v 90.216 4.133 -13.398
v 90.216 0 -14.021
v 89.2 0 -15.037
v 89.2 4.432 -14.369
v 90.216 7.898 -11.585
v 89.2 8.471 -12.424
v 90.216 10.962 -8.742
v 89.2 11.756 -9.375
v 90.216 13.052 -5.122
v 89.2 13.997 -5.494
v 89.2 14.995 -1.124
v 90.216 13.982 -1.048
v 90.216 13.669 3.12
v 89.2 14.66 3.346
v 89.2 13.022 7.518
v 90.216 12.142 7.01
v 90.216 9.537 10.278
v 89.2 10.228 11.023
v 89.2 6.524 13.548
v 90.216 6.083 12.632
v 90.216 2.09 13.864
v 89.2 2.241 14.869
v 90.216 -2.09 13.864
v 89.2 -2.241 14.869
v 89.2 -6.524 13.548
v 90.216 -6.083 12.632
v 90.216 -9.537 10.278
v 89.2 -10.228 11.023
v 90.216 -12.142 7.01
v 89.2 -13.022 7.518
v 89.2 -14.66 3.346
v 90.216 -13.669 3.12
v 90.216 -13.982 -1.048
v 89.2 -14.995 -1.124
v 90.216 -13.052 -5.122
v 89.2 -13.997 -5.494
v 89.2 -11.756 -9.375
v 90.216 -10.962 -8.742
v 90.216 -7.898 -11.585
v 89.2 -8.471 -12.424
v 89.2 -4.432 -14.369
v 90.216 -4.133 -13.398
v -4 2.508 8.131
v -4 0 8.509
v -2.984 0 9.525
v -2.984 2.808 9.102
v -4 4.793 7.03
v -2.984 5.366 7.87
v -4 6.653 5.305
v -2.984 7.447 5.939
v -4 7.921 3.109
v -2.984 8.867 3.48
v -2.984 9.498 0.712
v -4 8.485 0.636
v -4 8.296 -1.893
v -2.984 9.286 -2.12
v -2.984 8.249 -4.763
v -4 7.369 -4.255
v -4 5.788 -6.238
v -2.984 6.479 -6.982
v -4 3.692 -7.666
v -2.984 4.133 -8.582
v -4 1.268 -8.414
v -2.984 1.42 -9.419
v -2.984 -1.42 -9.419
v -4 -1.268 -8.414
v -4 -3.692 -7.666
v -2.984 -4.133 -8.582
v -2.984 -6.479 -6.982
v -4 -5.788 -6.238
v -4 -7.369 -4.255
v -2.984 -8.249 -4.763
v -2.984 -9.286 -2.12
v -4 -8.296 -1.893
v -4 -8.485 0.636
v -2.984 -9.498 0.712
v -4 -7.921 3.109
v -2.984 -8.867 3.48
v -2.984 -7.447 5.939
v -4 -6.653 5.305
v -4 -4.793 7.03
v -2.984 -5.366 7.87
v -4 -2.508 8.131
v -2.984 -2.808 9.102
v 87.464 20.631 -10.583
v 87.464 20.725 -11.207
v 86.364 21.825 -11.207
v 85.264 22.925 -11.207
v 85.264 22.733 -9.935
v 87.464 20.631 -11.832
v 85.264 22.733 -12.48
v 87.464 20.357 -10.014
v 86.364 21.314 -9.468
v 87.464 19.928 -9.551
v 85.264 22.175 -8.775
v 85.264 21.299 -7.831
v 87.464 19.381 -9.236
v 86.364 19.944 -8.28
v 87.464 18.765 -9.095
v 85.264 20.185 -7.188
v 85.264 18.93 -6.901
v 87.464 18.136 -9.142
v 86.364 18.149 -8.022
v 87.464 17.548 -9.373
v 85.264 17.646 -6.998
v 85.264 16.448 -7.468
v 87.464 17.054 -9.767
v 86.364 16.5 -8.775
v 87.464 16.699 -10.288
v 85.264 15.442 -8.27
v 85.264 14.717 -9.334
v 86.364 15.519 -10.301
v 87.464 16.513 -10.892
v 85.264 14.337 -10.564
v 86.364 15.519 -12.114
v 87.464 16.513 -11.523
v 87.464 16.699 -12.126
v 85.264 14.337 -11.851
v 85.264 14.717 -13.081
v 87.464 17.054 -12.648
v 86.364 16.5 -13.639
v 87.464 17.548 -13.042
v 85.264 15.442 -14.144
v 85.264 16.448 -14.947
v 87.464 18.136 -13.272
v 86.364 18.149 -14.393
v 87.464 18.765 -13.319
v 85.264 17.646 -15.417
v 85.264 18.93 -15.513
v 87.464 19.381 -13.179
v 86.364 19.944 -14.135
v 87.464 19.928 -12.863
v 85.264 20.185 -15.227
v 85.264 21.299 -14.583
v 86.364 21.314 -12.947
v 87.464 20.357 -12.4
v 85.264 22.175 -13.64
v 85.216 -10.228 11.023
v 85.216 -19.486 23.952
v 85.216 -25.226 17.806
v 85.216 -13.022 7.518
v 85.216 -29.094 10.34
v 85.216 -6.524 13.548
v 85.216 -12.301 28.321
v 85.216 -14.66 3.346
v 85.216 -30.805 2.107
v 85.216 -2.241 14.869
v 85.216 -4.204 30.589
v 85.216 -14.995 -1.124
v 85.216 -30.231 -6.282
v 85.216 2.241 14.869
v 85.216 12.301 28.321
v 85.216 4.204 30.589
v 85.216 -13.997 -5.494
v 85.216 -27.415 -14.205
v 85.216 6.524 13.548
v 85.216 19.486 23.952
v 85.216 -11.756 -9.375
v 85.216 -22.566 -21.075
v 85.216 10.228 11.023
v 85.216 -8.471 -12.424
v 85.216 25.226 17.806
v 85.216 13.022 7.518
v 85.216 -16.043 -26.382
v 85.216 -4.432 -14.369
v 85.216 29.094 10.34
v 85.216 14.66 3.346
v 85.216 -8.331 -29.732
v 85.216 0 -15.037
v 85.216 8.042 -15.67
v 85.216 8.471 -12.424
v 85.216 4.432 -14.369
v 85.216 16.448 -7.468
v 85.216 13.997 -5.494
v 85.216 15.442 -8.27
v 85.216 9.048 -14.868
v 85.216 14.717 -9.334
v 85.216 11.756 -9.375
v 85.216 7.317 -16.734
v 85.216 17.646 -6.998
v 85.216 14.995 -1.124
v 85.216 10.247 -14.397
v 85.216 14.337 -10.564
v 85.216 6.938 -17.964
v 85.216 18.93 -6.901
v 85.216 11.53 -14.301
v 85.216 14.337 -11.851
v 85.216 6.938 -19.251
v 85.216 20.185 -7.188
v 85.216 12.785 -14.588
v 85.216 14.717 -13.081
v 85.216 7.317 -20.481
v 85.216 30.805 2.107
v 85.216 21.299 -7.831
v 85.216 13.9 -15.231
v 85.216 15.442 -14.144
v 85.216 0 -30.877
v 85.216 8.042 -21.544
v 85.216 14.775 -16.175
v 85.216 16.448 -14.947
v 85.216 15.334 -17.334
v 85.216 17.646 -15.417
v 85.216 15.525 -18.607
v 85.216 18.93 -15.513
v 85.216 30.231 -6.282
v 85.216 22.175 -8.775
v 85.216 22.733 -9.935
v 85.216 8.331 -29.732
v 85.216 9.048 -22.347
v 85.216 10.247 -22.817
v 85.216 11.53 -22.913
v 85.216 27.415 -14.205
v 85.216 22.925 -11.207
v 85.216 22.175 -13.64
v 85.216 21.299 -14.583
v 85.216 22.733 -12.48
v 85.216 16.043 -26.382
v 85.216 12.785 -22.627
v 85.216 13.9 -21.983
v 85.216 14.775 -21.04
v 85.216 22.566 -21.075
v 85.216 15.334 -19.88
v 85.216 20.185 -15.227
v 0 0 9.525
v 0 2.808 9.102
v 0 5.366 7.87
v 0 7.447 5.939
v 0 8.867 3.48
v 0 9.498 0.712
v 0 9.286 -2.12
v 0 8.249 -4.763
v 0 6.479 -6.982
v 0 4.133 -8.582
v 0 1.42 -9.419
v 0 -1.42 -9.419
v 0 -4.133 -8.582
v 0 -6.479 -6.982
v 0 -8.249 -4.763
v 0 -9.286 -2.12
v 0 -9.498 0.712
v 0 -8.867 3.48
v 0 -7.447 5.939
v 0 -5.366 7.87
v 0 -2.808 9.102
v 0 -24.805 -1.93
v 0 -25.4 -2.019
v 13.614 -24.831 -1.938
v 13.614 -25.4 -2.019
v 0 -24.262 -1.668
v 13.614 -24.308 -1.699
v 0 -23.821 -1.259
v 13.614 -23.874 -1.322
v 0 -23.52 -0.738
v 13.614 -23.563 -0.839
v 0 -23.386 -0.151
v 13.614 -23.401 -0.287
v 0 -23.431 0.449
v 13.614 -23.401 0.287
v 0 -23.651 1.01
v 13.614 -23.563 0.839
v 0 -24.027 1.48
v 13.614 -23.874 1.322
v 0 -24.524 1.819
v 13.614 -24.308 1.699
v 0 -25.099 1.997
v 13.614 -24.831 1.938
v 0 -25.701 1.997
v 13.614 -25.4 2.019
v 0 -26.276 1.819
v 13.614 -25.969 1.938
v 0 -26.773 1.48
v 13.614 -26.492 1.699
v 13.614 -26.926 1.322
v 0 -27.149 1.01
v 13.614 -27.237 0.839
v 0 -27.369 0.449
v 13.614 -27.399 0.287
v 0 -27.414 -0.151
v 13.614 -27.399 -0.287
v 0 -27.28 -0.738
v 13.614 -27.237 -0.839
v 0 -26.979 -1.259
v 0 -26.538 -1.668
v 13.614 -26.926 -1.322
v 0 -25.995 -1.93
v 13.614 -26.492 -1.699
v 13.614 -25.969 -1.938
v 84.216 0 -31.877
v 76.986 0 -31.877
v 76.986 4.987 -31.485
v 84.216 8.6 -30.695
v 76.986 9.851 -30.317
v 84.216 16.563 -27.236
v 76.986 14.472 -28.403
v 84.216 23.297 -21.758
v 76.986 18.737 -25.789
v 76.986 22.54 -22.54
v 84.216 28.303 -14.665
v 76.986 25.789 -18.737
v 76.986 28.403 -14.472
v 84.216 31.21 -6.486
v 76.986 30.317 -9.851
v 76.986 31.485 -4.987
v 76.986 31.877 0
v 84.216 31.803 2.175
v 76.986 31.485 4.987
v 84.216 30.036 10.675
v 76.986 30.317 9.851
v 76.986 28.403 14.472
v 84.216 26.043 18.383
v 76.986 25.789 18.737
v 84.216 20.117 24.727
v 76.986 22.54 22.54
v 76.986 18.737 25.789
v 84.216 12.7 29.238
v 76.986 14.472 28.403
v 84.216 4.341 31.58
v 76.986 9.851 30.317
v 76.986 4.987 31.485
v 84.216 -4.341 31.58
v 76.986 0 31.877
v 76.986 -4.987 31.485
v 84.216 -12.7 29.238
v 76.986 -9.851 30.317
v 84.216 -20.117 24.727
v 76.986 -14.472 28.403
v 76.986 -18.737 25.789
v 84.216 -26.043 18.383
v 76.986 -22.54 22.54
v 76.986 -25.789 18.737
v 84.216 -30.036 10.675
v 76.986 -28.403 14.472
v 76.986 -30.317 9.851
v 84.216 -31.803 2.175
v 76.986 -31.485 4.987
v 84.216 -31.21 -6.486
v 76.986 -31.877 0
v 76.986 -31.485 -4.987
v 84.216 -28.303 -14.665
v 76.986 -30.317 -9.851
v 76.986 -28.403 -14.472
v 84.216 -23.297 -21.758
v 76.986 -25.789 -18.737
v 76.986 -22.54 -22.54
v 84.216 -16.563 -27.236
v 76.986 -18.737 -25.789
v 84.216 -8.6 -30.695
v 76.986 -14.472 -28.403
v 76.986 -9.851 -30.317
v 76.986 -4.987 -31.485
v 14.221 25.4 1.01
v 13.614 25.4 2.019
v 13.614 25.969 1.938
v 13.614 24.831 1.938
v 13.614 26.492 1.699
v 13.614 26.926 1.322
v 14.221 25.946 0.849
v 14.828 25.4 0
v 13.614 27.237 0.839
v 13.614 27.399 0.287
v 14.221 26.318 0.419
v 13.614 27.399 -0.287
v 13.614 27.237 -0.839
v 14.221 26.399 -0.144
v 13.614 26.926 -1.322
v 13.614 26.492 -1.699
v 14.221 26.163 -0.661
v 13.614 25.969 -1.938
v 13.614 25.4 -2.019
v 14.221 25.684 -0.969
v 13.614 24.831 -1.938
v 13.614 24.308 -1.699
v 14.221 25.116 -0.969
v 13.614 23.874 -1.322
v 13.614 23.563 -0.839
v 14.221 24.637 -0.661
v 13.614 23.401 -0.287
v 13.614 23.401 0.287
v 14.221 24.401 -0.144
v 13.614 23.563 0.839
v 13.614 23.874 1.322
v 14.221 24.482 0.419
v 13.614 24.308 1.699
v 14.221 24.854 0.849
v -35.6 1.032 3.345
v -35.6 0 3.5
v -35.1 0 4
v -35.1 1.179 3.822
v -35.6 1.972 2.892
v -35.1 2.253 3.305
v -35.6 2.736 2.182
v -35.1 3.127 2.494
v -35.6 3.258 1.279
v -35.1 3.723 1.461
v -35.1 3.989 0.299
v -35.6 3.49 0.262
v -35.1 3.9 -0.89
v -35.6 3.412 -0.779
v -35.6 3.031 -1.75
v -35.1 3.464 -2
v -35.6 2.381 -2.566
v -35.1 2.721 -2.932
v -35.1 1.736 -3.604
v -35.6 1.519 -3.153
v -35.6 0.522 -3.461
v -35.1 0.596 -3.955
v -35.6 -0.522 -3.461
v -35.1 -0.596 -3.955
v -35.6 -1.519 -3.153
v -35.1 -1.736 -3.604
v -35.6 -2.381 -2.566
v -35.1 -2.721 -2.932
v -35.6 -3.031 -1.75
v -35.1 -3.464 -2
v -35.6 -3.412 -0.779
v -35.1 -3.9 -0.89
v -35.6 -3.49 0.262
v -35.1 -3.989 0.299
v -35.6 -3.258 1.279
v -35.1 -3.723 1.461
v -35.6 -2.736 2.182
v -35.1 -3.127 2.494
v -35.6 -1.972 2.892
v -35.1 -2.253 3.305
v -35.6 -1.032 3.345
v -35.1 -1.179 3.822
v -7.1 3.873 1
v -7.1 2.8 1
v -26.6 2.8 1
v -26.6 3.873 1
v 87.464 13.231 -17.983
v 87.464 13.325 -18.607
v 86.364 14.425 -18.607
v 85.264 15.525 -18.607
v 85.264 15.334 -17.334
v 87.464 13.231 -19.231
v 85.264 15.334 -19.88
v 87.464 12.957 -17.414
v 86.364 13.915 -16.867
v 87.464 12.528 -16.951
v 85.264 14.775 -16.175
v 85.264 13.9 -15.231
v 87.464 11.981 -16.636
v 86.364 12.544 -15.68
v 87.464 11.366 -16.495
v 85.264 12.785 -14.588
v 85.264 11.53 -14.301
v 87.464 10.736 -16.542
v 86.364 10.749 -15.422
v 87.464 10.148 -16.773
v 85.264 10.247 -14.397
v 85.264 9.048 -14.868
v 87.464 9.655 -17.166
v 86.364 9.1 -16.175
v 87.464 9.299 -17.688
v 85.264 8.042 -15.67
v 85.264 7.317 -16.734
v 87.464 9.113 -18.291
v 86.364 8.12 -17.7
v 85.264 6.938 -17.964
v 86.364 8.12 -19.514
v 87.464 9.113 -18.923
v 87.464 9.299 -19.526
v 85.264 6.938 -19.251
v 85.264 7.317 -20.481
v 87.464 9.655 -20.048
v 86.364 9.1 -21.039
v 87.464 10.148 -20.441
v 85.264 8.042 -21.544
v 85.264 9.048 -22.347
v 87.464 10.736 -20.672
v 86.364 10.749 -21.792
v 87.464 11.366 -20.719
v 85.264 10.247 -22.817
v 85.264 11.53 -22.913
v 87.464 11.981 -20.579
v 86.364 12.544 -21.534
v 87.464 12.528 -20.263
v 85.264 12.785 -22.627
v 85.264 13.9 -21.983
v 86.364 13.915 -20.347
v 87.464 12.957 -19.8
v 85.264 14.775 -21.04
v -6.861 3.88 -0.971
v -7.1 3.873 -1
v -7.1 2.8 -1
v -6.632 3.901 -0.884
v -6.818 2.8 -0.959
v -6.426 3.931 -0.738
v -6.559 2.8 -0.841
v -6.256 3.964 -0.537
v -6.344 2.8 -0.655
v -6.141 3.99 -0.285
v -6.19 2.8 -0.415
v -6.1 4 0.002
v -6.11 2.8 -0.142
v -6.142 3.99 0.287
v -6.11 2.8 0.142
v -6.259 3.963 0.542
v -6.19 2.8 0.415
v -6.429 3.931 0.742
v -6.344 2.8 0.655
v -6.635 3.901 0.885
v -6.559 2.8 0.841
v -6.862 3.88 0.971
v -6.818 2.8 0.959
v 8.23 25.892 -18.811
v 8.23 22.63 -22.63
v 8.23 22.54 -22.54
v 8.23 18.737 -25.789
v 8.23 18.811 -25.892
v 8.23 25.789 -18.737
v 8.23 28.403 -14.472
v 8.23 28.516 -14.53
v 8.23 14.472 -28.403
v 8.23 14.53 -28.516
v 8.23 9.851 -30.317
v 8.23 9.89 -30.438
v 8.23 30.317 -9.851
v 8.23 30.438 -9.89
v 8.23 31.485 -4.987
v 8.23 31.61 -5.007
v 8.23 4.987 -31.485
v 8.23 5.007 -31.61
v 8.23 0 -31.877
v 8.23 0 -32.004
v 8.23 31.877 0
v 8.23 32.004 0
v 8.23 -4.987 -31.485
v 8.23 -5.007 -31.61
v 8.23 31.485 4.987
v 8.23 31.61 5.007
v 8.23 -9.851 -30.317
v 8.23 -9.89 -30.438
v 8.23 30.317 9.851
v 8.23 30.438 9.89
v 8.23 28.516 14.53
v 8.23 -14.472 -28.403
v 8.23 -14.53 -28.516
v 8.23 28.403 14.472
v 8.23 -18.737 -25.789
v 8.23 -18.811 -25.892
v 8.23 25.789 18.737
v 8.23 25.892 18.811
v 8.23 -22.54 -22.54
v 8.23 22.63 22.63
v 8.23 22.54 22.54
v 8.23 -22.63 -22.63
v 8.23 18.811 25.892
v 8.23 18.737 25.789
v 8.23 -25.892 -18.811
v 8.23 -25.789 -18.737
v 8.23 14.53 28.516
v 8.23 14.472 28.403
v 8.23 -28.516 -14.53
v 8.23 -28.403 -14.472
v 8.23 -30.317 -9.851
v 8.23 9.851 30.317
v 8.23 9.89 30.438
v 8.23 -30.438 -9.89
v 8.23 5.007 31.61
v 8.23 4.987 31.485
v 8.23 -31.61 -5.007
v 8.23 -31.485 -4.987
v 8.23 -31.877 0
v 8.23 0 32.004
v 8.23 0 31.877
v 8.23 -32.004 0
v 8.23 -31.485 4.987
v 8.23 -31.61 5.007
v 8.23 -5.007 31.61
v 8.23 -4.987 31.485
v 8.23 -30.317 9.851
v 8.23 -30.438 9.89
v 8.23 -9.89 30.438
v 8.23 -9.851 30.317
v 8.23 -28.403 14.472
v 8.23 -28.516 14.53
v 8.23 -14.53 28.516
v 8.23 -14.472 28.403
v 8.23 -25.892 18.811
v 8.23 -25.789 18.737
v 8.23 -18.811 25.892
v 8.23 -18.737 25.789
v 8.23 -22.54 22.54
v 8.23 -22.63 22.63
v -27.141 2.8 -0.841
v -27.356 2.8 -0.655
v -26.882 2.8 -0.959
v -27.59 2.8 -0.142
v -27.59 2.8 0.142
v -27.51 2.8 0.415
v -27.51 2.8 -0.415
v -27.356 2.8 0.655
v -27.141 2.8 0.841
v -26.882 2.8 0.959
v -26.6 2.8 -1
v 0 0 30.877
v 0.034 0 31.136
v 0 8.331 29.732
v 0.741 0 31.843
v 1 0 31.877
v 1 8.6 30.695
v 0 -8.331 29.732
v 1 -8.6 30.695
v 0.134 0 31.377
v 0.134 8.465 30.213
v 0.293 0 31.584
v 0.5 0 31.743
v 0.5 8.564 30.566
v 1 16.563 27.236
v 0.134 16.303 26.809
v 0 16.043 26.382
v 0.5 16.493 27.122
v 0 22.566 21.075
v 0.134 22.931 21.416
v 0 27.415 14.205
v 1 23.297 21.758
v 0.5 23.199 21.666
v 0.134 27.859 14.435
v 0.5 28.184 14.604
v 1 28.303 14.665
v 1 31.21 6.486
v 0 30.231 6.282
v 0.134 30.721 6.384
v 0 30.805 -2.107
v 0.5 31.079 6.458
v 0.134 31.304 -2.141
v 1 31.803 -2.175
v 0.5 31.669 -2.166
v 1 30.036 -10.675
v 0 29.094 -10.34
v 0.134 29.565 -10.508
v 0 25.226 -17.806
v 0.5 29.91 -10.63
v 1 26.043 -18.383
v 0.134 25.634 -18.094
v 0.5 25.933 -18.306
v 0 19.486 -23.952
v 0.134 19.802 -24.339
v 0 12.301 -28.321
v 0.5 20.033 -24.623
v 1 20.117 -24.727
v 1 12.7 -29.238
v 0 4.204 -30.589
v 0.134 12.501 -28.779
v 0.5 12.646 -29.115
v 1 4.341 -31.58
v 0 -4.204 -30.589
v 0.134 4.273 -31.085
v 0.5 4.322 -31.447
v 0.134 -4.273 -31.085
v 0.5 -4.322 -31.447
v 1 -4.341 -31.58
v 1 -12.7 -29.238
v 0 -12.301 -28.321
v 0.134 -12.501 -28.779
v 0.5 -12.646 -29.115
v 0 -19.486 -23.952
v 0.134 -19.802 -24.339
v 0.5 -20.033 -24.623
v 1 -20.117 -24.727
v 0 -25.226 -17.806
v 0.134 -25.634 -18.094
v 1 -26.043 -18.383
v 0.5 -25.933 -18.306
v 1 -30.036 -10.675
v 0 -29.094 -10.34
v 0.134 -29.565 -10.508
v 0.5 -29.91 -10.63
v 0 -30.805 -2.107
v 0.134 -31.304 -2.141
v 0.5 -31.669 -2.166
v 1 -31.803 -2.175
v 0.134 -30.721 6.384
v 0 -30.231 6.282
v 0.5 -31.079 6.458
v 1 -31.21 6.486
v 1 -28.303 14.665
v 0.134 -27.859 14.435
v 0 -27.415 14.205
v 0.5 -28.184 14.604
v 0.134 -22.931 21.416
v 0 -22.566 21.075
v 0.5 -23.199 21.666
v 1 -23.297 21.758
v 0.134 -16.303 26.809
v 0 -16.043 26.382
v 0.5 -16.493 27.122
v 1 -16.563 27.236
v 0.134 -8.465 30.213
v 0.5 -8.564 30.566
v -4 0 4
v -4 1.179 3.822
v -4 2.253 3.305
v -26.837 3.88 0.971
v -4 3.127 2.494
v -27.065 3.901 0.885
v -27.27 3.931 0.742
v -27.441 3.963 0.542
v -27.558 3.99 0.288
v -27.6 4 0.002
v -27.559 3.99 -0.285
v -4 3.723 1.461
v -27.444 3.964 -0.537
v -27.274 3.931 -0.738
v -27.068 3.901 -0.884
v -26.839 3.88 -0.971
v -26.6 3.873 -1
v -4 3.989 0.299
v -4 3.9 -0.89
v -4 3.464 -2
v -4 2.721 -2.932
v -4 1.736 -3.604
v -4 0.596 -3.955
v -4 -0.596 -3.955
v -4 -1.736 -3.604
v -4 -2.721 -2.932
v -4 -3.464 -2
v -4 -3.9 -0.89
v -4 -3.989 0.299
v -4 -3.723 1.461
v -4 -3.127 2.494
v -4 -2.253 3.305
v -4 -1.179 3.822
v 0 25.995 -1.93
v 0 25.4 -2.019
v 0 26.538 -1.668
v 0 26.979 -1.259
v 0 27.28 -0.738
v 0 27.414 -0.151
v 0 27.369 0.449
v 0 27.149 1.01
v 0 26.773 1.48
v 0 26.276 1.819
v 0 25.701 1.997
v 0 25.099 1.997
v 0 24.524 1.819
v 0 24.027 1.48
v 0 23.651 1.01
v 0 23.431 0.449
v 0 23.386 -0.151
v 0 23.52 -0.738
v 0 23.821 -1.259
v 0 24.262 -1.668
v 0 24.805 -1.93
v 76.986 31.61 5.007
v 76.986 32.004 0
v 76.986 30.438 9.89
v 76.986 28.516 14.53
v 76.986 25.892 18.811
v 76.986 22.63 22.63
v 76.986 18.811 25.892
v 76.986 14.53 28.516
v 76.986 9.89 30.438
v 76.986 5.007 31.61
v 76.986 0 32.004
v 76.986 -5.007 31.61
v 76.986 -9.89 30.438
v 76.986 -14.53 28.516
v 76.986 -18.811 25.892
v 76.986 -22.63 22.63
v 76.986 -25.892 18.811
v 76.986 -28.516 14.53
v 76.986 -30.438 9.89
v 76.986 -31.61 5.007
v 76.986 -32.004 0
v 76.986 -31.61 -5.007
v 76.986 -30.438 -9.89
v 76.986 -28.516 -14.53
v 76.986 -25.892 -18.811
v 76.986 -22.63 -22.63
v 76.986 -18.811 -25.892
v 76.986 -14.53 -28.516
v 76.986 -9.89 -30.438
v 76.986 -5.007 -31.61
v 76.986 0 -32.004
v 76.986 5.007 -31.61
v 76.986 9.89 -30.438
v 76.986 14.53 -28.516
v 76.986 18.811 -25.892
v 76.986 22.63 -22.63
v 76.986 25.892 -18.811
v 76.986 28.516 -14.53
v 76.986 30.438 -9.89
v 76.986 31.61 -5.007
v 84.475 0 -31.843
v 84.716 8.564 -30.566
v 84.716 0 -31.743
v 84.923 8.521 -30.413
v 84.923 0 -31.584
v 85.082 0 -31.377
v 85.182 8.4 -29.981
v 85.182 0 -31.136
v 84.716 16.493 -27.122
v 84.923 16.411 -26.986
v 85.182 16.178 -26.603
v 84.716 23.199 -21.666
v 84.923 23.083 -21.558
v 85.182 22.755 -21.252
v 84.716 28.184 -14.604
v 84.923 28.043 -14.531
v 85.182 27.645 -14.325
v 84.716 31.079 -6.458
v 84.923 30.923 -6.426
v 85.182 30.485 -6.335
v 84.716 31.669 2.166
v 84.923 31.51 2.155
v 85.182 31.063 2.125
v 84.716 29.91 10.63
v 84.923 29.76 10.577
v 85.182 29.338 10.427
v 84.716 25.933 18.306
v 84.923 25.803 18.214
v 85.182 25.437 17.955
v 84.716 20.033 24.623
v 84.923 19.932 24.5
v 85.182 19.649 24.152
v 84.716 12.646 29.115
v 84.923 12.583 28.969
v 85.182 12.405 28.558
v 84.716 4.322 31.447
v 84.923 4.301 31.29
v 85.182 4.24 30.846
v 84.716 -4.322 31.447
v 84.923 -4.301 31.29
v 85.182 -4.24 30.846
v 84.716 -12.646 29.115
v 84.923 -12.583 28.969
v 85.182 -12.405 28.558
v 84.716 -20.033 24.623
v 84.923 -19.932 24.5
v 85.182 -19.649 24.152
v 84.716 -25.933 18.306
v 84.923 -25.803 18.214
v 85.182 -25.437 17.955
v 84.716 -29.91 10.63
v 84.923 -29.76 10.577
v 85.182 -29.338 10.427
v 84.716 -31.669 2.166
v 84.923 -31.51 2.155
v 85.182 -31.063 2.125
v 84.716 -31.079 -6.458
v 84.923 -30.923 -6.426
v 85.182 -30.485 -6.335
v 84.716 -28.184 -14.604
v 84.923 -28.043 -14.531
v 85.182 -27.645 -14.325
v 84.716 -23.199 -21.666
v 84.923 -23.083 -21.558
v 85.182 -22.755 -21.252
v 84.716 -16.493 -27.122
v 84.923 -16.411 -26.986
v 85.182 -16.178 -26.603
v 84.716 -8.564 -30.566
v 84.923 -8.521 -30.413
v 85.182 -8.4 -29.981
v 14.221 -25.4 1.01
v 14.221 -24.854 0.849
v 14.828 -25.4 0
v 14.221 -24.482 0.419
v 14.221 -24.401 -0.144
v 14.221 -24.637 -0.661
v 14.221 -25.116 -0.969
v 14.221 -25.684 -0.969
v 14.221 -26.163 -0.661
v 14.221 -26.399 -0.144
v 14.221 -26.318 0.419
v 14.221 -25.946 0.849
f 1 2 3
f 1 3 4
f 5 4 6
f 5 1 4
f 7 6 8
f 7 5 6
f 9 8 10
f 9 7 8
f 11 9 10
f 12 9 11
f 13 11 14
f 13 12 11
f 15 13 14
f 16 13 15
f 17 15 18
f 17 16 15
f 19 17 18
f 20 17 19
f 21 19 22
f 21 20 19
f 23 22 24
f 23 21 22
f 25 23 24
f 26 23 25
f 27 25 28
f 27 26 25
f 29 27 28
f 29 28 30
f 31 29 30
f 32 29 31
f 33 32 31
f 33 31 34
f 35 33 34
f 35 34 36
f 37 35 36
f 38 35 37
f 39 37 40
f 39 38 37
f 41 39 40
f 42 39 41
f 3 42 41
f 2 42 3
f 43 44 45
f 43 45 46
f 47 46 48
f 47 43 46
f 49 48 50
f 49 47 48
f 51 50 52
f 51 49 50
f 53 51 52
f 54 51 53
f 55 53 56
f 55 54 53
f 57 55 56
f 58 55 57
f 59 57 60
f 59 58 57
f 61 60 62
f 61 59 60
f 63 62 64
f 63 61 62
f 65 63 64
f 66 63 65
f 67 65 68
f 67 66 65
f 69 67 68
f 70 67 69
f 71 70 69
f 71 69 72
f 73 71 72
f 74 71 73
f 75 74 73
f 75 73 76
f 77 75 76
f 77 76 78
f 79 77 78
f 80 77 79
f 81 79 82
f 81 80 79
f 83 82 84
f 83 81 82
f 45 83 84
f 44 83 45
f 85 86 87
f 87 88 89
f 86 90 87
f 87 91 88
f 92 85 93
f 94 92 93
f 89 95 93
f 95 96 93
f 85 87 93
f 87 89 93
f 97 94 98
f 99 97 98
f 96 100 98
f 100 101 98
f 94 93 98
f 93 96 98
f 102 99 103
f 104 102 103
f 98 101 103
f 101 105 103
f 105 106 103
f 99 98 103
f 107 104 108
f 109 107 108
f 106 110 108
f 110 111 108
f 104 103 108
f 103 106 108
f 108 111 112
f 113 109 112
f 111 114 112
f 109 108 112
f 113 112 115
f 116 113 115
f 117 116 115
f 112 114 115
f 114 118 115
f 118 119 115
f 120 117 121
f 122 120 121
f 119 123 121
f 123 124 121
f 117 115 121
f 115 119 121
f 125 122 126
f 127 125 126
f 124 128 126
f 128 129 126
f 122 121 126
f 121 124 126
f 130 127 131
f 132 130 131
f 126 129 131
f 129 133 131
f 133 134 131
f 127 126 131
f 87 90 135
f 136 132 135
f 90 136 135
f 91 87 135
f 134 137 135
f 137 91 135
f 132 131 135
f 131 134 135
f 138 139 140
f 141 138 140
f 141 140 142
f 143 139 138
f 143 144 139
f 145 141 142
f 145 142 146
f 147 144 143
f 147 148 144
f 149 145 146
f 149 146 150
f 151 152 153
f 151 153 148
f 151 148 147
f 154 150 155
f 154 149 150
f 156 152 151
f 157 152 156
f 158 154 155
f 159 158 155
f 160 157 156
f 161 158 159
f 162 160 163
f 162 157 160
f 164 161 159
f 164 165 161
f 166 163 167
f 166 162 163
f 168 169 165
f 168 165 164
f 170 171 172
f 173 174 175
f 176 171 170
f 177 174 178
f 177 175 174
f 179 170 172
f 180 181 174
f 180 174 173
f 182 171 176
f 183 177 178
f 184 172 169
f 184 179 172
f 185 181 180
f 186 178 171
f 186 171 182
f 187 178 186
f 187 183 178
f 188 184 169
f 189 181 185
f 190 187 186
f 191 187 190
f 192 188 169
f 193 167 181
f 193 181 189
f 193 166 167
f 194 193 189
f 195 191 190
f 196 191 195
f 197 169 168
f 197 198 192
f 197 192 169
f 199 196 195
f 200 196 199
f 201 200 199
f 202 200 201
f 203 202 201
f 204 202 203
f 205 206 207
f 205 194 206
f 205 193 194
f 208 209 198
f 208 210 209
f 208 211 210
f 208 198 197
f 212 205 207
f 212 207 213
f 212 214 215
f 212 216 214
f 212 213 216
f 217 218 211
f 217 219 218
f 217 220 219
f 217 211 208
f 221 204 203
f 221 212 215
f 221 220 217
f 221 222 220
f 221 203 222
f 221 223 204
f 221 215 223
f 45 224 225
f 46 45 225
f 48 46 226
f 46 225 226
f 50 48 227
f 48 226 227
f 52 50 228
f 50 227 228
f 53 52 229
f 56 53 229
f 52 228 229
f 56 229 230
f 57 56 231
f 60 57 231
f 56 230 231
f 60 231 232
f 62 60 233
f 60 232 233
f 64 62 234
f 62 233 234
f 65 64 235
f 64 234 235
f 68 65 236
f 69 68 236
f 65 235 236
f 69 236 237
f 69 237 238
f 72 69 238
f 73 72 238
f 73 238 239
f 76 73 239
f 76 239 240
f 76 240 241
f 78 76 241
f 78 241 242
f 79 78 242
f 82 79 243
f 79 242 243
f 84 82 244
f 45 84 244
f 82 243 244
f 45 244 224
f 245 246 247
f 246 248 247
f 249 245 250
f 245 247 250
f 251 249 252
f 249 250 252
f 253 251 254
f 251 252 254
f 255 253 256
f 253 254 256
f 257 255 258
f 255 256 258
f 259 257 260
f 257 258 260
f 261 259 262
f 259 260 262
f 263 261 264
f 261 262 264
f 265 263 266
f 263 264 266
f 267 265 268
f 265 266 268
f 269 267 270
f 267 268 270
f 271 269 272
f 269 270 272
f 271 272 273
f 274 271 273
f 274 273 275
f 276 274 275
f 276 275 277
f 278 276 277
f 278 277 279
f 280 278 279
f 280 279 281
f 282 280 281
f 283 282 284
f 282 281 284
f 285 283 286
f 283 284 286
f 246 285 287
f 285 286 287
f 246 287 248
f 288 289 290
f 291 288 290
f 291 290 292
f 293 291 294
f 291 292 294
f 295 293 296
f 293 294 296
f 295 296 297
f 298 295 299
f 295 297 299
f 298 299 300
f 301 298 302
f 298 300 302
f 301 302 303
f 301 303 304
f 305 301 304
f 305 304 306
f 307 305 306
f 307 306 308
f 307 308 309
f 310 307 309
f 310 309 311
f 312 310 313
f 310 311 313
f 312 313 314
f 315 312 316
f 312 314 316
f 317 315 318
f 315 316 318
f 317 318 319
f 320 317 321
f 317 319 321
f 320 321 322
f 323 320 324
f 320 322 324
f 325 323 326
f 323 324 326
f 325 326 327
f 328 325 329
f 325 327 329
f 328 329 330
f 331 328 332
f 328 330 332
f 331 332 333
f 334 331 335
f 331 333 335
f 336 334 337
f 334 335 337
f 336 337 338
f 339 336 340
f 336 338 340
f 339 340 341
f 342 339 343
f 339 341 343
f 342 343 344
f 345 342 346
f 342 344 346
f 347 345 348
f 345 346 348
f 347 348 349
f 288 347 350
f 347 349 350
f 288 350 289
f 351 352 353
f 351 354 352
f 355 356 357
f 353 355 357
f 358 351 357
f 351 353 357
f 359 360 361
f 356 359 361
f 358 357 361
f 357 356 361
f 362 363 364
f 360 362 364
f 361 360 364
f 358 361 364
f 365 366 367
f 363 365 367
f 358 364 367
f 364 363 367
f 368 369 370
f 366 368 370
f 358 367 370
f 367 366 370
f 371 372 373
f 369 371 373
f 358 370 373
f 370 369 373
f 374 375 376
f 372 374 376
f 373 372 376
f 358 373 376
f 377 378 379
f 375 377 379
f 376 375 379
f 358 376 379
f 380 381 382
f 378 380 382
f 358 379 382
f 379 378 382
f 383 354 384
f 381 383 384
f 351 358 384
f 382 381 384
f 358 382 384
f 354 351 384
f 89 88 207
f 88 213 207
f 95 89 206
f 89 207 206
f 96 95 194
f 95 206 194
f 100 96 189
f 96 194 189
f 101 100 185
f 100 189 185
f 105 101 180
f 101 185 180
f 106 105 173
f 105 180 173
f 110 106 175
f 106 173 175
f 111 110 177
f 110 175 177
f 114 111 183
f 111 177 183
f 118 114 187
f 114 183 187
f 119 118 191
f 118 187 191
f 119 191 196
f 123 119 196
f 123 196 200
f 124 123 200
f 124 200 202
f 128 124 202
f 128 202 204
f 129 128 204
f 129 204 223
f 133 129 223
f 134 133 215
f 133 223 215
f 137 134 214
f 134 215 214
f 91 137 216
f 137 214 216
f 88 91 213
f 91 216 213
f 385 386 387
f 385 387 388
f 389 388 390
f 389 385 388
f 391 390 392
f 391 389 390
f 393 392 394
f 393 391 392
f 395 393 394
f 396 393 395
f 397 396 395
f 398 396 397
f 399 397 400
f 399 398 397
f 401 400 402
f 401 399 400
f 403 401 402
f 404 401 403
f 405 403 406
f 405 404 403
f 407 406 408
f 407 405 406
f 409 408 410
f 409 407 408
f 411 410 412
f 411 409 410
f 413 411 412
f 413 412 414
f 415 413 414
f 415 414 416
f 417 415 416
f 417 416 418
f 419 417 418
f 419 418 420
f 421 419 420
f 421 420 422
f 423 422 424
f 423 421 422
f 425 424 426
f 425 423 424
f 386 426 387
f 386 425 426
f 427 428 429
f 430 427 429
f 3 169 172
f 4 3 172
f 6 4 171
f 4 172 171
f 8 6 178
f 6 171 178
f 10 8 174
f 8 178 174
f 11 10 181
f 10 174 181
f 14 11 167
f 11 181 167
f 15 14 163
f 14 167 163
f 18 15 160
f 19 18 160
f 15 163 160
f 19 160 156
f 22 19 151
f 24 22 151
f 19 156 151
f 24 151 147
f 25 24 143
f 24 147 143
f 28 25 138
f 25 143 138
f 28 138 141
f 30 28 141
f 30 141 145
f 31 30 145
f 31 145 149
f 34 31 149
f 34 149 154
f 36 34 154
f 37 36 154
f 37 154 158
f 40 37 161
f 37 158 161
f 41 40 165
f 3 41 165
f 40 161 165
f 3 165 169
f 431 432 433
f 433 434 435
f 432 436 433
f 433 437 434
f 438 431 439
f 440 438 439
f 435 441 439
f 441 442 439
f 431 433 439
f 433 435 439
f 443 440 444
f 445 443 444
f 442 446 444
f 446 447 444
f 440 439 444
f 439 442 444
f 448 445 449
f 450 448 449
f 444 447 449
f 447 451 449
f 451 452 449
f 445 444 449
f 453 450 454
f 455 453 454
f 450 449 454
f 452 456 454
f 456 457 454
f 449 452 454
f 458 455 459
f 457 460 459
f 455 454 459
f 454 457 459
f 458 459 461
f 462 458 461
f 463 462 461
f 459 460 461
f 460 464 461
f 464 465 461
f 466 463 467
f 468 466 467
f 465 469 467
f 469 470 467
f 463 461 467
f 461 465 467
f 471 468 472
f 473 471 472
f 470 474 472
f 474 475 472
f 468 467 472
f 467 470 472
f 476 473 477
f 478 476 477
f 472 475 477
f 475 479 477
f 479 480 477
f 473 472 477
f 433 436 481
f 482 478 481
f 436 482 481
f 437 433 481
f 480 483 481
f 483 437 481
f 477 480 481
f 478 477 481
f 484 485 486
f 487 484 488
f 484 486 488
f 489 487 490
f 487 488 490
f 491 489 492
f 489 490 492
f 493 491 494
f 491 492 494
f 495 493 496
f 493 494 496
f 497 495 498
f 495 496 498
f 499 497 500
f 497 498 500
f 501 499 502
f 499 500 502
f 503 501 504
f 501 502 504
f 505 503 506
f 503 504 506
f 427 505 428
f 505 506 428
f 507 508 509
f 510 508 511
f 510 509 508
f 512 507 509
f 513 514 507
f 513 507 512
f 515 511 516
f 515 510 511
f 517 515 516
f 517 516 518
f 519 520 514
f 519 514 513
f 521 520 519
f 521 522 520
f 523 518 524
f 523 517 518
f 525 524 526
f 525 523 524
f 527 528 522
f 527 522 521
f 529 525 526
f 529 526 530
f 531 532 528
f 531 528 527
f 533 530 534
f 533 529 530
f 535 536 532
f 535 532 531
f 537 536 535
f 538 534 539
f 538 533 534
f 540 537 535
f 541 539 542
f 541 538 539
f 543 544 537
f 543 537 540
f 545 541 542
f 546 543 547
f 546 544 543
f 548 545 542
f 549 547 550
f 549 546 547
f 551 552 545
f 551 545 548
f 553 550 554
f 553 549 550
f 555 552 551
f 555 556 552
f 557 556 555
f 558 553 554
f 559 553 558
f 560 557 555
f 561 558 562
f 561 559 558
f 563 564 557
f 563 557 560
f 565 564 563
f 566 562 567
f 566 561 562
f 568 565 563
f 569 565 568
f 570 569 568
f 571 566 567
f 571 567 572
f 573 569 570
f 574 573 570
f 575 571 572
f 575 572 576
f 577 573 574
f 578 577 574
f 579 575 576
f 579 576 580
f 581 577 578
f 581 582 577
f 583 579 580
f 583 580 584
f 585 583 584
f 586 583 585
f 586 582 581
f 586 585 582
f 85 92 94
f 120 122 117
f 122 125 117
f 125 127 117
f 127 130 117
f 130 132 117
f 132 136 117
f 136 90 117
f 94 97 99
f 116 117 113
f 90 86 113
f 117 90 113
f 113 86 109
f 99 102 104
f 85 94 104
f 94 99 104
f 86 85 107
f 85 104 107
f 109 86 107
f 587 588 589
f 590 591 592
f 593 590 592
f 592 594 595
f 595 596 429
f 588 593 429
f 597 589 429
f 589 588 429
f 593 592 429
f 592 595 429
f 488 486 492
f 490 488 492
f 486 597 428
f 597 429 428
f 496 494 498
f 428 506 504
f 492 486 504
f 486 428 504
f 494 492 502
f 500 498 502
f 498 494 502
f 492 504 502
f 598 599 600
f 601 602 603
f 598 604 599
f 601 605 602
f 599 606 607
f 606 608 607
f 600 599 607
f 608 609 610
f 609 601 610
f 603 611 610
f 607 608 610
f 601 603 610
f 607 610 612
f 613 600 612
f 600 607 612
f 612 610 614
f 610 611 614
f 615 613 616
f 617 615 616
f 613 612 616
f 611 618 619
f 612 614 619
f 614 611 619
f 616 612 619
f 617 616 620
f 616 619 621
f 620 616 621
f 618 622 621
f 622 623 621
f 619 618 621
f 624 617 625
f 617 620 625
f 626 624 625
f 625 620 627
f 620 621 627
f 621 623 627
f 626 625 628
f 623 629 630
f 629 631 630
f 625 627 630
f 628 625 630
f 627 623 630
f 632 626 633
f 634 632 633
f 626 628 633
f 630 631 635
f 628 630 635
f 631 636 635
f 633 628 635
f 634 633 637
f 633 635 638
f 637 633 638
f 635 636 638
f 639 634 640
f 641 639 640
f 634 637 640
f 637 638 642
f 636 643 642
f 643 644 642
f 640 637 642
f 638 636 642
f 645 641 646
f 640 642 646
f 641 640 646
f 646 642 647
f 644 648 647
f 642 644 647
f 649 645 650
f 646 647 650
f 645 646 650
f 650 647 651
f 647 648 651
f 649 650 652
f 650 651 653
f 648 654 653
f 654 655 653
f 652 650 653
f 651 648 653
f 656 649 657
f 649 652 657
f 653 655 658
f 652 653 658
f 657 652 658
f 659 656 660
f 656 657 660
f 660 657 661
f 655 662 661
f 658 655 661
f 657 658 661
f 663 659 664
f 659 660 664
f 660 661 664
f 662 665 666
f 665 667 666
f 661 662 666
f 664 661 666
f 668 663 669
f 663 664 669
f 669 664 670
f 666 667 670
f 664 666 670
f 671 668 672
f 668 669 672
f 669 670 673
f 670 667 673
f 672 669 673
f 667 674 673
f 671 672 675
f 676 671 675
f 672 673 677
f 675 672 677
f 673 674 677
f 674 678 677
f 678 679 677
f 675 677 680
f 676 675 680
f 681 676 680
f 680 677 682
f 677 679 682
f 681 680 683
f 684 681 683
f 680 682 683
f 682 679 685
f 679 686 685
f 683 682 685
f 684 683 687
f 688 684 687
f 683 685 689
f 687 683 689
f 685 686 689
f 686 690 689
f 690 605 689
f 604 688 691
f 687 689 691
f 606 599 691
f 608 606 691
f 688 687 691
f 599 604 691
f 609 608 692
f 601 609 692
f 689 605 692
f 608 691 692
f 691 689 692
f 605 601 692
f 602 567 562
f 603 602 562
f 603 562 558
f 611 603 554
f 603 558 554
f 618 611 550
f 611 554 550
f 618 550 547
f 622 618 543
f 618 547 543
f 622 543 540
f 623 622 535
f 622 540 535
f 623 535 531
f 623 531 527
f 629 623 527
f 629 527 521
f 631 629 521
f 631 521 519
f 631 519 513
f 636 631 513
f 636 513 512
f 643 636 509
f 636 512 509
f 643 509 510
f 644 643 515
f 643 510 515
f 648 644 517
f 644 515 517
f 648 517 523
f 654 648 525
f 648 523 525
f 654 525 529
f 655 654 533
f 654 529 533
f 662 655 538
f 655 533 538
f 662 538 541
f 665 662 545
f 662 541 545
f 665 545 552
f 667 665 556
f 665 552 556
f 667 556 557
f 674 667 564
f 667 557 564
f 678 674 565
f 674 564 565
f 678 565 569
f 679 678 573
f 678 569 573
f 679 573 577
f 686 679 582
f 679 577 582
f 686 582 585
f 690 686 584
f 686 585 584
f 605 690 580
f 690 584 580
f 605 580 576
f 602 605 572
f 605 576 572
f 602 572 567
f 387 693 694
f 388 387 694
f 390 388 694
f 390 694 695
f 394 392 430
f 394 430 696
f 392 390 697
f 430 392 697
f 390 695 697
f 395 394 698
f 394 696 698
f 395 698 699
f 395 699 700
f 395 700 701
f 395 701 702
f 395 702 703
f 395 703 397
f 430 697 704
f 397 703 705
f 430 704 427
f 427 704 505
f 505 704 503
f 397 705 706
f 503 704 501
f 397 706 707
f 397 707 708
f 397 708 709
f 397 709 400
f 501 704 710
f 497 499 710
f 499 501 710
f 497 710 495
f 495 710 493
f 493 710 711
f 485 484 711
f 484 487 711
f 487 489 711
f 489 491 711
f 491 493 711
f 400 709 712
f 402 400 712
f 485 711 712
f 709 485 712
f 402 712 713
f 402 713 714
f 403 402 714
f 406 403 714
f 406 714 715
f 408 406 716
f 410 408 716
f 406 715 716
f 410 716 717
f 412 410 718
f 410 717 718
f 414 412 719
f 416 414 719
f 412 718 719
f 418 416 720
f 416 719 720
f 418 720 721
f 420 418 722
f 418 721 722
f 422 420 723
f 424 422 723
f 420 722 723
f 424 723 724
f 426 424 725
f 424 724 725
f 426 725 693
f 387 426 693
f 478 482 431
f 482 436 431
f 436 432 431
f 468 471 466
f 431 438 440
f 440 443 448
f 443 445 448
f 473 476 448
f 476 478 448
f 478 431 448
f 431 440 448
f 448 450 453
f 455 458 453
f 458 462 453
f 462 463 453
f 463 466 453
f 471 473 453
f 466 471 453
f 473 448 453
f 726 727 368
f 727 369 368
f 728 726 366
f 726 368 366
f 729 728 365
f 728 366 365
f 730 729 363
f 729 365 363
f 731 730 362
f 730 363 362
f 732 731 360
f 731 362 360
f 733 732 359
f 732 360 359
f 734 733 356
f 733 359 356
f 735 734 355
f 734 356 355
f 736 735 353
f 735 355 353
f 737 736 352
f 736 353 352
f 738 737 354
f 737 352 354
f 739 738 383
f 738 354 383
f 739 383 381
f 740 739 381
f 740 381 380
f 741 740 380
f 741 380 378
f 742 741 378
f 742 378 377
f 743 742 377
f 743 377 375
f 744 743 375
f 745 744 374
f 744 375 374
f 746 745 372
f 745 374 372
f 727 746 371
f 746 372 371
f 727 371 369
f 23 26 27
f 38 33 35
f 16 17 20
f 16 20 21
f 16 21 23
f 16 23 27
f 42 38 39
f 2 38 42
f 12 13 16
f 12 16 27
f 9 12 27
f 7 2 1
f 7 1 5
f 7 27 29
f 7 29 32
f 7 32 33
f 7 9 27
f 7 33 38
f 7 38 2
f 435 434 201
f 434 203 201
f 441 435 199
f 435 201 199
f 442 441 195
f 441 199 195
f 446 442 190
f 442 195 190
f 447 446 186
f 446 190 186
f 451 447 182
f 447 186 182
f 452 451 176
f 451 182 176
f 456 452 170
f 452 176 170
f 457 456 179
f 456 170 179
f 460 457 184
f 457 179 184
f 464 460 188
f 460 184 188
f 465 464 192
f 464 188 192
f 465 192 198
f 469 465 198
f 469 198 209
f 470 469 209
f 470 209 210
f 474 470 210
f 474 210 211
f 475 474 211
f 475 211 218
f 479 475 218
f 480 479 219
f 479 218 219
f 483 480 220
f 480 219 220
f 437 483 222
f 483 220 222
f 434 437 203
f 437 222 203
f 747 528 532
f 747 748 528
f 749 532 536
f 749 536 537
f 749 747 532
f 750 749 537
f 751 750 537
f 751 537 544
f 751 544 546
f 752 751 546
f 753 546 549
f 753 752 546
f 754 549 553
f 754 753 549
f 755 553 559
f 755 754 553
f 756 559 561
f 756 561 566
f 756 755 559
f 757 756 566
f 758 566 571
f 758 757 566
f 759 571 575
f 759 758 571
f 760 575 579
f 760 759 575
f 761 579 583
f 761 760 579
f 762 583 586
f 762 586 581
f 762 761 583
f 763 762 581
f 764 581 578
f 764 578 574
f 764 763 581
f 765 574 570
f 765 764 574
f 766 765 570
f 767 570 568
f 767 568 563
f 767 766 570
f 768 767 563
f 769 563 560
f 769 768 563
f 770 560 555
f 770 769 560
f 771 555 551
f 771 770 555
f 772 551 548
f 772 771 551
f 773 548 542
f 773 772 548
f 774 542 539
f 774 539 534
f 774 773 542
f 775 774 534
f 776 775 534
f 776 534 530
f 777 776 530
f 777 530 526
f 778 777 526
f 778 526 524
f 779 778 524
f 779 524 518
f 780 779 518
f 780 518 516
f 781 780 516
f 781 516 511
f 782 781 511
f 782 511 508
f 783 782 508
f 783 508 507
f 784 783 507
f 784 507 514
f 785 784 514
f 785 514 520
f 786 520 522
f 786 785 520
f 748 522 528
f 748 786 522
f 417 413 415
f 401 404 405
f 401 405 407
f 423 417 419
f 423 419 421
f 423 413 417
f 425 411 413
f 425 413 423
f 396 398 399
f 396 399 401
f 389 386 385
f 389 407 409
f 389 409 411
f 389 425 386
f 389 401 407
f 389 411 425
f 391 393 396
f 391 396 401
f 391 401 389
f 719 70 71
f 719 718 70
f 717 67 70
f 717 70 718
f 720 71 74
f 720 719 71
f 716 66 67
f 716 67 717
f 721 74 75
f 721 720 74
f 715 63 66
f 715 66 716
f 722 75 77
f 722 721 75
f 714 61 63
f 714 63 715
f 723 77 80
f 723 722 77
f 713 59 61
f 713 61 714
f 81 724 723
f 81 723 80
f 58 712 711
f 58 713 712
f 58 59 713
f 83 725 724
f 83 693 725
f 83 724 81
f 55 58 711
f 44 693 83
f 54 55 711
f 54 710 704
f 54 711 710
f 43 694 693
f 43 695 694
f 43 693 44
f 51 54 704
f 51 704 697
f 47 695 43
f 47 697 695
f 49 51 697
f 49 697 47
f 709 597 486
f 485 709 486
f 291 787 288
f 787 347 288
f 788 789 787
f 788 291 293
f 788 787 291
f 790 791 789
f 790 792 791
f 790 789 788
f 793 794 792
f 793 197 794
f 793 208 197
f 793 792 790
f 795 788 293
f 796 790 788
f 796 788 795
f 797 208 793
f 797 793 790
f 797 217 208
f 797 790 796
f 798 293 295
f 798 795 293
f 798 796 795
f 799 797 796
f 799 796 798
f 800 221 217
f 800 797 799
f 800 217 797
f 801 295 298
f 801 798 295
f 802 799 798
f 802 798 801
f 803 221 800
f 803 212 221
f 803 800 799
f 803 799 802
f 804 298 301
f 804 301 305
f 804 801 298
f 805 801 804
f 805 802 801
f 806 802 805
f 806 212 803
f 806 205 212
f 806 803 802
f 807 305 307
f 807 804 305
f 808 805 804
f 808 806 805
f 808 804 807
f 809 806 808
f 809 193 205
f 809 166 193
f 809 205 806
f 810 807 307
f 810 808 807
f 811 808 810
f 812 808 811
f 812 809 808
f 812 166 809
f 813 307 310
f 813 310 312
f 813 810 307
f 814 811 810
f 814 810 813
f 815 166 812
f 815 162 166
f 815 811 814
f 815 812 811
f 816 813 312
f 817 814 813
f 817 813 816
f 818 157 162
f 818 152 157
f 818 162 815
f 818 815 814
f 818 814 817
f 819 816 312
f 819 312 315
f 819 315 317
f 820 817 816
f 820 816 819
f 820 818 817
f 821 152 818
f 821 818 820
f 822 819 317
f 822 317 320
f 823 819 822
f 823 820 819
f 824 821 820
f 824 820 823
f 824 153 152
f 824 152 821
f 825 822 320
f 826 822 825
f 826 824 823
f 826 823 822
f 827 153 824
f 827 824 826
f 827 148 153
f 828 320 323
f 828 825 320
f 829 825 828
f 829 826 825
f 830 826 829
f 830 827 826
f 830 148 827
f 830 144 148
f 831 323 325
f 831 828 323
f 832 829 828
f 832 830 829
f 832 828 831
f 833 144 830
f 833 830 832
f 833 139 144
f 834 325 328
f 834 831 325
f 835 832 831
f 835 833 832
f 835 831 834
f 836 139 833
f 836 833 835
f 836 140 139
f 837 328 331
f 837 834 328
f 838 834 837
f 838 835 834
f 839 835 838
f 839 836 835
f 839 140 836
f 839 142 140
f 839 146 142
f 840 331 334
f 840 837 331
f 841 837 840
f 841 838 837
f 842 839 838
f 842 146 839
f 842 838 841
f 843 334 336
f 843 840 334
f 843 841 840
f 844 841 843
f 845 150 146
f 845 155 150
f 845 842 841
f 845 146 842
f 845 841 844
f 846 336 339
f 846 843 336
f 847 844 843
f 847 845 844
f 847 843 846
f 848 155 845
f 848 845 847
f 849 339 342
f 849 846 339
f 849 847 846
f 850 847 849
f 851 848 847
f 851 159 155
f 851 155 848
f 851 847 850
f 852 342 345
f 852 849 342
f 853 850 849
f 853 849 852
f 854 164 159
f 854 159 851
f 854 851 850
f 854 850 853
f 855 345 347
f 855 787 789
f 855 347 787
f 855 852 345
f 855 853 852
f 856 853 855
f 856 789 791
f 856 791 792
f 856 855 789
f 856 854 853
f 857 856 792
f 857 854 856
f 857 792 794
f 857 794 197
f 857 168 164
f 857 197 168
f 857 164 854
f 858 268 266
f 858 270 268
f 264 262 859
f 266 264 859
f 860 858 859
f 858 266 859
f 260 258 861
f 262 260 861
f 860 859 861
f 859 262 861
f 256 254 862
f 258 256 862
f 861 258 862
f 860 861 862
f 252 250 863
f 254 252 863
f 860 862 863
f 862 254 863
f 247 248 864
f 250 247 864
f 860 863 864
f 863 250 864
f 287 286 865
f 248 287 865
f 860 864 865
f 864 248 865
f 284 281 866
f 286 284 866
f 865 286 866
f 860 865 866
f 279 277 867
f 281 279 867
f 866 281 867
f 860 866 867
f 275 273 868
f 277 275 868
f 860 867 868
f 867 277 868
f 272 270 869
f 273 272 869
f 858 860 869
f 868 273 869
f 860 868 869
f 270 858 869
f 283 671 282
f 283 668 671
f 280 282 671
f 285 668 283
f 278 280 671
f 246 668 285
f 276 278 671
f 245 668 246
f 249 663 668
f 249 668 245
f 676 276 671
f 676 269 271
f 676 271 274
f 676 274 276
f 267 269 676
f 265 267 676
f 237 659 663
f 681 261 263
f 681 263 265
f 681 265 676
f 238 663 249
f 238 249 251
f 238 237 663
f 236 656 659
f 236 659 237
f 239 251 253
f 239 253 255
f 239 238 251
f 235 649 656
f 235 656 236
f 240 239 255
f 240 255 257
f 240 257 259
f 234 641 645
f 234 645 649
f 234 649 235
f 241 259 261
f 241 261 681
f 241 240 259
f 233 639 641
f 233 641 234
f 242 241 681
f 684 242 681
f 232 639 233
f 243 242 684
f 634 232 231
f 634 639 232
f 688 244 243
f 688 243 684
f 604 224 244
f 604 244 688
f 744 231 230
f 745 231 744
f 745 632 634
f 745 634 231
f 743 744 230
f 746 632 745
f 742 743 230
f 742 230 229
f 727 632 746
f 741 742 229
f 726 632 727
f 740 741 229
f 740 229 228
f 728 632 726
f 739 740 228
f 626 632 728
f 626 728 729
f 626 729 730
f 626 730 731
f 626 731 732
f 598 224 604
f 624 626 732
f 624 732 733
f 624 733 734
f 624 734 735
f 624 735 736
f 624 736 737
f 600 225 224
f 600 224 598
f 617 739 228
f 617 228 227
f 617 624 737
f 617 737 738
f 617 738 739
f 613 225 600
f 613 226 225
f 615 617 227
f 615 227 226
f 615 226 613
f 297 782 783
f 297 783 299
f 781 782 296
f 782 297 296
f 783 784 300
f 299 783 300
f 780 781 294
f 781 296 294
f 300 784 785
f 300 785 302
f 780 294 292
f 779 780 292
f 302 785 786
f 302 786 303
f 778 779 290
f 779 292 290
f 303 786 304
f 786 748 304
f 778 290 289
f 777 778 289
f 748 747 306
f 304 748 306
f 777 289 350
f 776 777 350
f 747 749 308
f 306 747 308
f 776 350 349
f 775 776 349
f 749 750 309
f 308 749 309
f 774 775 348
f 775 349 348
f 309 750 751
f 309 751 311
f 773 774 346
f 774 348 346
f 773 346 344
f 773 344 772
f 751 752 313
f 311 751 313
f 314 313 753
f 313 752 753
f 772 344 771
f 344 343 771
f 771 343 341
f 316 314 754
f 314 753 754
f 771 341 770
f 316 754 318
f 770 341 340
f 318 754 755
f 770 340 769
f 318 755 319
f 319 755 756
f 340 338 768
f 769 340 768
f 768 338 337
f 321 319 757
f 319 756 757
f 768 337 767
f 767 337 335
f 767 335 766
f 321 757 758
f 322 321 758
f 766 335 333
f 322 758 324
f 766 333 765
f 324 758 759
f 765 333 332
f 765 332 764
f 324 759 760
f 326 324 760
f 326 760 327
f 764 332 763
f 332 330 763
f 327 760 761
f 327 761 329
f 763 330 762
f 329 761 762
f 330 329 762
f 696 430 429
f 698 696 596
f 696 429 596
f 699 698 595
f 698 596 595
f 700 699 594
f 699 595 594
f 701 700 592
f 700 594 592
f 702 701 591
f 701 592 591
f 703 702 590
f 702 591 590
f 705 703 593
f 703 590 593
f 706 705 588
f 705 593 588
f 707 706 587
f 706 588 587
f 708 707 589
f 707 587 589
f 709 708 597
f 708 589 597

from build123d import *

# Parameters (mm, degrees)
SKETCH1_W                  = 68.7568
SKETCH1_H                  = 32.004
SKETCH2_R                  = 31.877
BOSS_EXTRUDE1_DEPTH        = 8.2296
SKETCH3_R                  = 15.0368
BOSS_EXTRUDE2_DEPTH        = 5
SKETCH4_R                  = 31.877
BOSS_EXTRUDE3_DEPTH        = 8.2296
SKETCH5_R                  = 9.525
BOSS_EXTRUDE4_DEPTH        = 4
SKETCH6_R                  = 4
BOSS_EXTRUDE5_DEPTH        = 31.6
CUT_EXTRUDE1_REACH         = 31.204
M3_5_CLEARANCE_HOLE1_D     = 4.0386
M3_5_CLEARANCE_HOLE1_DEPTH = 13.6144
M3_5_CLEARANCE_HOLE1_TIP   = 1.213317848
CHAMFER1_SIZE              = 1.016
CHAMFER2_SIZE              = 0.5
FILLET1_R                  = 1


with BuildPart() as part:
    # Sketch1 → Revolve1 (revolve)
    with BuildSketch(Plane.XY):
        with Locations((42.608, 16.002)):
            Rectangle(SKETCH1_W, SKETCH1_H)
    revolve(axis=Axis((8.2296, 0, 0), (1, 0, 0)))

    # Sketch2 → Boss-Extrude1 (add)
    with BuildSketch(Plane(origin=(76.9864, 0, 0), x_dir=(0, 0, -1), z_dir=(1, 0, 0))):
        Circle(SKETCH2_R)
    extrude(amount=BOSS_EXTRUDE1_DEPTH)

    # Sketch3 → Boss-Extrude2 (add)
    with BuildSketch(Plane(origin=(85.216, 0, 0), x_dir=(0, 0, -1), z_dir=(1, 0, 0))):
        Circle(SKETCH3_R)
    extrude(amount=BOSS_EXTRUDE2_DEPTH)

    # Sketch4 → Boss-Extrude3 (add)
    with BuildSketch(Plane.ZY.offset(-8.2296)):
        Circle(SKETCH4_R)
    extrude(amount=BOSS_EXTRUDE3_DEPTH)

    # Sketch5 → Boss-Extrude4 (add)
    with BuildSketch(Plane.ZY):
        Circle(SKETCH5_R)
    extrude(amount=BOSS_EXTRUDE4_DEPTH)

    # Sketch6 → Boss-Extrude5 (add)
    with BuildSketch(Plane.ZY.offset(4)):
        Circle(SKETCH6_R)
    extrude(amount=BOSS_EXTRUDE5_DEPTH)

    # Sketch7 → Cut-Extrude1 (cut, up to next)
    with BuildSketch(Plane.XZ.offset(-2.8), mode=Mode.PRIVATE) as cut_extrude1_sk1:
        with BuildLine():
            Line((-7.1, 1), (-26.6, 1))
            ThreePointArc((-26.6, 1), (-27.6, 0), (-26.6, -1))
            Line((-26.6, -1), (-7.1, -1))
            ThreePointArc((-7.1, -1), (-6.1, 0), (-7.1, 1))
        make_face()
    cut_extrude1_tool1 = extrude(cut_extrude1_sk1.sketch, amount=-CUT_EXTRUDE1_REACH, mode=Mode.PRIVATE) & part.part
    add(cut_extrude1_tool1.solids().sort_by_distance((-16.85, 2.8, 0))[0], mode=Mode.SUBTRACT)

    # Sketch8 → Revolve2 (revolve)
    with BuildSketch(Plane.XY.offset(-18.607090683)):
        Polygon((85.216, 15.525359639), (85.216, 11.207359639), (87.4639, 11.207359639), (87.4639, 13.325359639), (85.2639, 15.525359639), align=None)
    revolve(axis=Axis((85.216, 11.207359639, -18.607090683), (1, 0, 0)))

    # Sketch9 → Revolve3 (revolve)
    with BuildSketch(Plane.XY.offset(-11.207359639)):
        Polygon((85.216, 22.925090683), (85.216, 18.607090683), (87.4639, 18.607090683), (87.4639, 20.725090683), (85.2639, 22.925090683), align=None)
    revolve(axis=Axis((85.216, 18.607090683, -11.207359639), (1, 0, 0)))

    # M3.5 Clearance Hole1
    with Locations(Plane.ZY):
        with Locations((0, 25.4), (0, -25.4)):
            Hole(M3_5_CLEARANCE_HOLE1_D / 2, depth=M3_5_CLEARANCE_HOLE1_DEPTH)
            with Locations((0, 0, -(M3_5_CLEARANCE_HOLE1_DEPTH + M3_5_CLEARANCE_HOLE1_TIP / 2))):  # 118° drill point
                Cone(0, M3_5_CLEARANCE_HOLE1_D / 2, M3_5_CLEARANCE_HOLE1_TIP, mode=Mode.SUBTRACT)

    # Chamfer1
    chamfer1_edges = [part.edges().sort_by_distance(p)[0] for p in [
        (90.216, 0, 15.0368),
        (-4, 0, -9.525),
    ]]
    chamfer(chamfer1_edges, length=CHAMFER1_SIZE)

    # Chamfer2
    chamfer2_edges = [part.edges().sort_by_distance(p)[0] for p in [
        (-35.6, 0, -4),
    ]]
    chamfer(chamfer2_edges, length=CHAMFER2_SIZE)

    # Fillet1
    fillet1_edges = [part.edges().sort_by_distance(p)[0] for p in [
        (0, 0, -31.877),
        (85.216, 0, 31.877),
    ]]
    fillet(fillet1_edges, radius=FILLET1_R)


solid = part.part
